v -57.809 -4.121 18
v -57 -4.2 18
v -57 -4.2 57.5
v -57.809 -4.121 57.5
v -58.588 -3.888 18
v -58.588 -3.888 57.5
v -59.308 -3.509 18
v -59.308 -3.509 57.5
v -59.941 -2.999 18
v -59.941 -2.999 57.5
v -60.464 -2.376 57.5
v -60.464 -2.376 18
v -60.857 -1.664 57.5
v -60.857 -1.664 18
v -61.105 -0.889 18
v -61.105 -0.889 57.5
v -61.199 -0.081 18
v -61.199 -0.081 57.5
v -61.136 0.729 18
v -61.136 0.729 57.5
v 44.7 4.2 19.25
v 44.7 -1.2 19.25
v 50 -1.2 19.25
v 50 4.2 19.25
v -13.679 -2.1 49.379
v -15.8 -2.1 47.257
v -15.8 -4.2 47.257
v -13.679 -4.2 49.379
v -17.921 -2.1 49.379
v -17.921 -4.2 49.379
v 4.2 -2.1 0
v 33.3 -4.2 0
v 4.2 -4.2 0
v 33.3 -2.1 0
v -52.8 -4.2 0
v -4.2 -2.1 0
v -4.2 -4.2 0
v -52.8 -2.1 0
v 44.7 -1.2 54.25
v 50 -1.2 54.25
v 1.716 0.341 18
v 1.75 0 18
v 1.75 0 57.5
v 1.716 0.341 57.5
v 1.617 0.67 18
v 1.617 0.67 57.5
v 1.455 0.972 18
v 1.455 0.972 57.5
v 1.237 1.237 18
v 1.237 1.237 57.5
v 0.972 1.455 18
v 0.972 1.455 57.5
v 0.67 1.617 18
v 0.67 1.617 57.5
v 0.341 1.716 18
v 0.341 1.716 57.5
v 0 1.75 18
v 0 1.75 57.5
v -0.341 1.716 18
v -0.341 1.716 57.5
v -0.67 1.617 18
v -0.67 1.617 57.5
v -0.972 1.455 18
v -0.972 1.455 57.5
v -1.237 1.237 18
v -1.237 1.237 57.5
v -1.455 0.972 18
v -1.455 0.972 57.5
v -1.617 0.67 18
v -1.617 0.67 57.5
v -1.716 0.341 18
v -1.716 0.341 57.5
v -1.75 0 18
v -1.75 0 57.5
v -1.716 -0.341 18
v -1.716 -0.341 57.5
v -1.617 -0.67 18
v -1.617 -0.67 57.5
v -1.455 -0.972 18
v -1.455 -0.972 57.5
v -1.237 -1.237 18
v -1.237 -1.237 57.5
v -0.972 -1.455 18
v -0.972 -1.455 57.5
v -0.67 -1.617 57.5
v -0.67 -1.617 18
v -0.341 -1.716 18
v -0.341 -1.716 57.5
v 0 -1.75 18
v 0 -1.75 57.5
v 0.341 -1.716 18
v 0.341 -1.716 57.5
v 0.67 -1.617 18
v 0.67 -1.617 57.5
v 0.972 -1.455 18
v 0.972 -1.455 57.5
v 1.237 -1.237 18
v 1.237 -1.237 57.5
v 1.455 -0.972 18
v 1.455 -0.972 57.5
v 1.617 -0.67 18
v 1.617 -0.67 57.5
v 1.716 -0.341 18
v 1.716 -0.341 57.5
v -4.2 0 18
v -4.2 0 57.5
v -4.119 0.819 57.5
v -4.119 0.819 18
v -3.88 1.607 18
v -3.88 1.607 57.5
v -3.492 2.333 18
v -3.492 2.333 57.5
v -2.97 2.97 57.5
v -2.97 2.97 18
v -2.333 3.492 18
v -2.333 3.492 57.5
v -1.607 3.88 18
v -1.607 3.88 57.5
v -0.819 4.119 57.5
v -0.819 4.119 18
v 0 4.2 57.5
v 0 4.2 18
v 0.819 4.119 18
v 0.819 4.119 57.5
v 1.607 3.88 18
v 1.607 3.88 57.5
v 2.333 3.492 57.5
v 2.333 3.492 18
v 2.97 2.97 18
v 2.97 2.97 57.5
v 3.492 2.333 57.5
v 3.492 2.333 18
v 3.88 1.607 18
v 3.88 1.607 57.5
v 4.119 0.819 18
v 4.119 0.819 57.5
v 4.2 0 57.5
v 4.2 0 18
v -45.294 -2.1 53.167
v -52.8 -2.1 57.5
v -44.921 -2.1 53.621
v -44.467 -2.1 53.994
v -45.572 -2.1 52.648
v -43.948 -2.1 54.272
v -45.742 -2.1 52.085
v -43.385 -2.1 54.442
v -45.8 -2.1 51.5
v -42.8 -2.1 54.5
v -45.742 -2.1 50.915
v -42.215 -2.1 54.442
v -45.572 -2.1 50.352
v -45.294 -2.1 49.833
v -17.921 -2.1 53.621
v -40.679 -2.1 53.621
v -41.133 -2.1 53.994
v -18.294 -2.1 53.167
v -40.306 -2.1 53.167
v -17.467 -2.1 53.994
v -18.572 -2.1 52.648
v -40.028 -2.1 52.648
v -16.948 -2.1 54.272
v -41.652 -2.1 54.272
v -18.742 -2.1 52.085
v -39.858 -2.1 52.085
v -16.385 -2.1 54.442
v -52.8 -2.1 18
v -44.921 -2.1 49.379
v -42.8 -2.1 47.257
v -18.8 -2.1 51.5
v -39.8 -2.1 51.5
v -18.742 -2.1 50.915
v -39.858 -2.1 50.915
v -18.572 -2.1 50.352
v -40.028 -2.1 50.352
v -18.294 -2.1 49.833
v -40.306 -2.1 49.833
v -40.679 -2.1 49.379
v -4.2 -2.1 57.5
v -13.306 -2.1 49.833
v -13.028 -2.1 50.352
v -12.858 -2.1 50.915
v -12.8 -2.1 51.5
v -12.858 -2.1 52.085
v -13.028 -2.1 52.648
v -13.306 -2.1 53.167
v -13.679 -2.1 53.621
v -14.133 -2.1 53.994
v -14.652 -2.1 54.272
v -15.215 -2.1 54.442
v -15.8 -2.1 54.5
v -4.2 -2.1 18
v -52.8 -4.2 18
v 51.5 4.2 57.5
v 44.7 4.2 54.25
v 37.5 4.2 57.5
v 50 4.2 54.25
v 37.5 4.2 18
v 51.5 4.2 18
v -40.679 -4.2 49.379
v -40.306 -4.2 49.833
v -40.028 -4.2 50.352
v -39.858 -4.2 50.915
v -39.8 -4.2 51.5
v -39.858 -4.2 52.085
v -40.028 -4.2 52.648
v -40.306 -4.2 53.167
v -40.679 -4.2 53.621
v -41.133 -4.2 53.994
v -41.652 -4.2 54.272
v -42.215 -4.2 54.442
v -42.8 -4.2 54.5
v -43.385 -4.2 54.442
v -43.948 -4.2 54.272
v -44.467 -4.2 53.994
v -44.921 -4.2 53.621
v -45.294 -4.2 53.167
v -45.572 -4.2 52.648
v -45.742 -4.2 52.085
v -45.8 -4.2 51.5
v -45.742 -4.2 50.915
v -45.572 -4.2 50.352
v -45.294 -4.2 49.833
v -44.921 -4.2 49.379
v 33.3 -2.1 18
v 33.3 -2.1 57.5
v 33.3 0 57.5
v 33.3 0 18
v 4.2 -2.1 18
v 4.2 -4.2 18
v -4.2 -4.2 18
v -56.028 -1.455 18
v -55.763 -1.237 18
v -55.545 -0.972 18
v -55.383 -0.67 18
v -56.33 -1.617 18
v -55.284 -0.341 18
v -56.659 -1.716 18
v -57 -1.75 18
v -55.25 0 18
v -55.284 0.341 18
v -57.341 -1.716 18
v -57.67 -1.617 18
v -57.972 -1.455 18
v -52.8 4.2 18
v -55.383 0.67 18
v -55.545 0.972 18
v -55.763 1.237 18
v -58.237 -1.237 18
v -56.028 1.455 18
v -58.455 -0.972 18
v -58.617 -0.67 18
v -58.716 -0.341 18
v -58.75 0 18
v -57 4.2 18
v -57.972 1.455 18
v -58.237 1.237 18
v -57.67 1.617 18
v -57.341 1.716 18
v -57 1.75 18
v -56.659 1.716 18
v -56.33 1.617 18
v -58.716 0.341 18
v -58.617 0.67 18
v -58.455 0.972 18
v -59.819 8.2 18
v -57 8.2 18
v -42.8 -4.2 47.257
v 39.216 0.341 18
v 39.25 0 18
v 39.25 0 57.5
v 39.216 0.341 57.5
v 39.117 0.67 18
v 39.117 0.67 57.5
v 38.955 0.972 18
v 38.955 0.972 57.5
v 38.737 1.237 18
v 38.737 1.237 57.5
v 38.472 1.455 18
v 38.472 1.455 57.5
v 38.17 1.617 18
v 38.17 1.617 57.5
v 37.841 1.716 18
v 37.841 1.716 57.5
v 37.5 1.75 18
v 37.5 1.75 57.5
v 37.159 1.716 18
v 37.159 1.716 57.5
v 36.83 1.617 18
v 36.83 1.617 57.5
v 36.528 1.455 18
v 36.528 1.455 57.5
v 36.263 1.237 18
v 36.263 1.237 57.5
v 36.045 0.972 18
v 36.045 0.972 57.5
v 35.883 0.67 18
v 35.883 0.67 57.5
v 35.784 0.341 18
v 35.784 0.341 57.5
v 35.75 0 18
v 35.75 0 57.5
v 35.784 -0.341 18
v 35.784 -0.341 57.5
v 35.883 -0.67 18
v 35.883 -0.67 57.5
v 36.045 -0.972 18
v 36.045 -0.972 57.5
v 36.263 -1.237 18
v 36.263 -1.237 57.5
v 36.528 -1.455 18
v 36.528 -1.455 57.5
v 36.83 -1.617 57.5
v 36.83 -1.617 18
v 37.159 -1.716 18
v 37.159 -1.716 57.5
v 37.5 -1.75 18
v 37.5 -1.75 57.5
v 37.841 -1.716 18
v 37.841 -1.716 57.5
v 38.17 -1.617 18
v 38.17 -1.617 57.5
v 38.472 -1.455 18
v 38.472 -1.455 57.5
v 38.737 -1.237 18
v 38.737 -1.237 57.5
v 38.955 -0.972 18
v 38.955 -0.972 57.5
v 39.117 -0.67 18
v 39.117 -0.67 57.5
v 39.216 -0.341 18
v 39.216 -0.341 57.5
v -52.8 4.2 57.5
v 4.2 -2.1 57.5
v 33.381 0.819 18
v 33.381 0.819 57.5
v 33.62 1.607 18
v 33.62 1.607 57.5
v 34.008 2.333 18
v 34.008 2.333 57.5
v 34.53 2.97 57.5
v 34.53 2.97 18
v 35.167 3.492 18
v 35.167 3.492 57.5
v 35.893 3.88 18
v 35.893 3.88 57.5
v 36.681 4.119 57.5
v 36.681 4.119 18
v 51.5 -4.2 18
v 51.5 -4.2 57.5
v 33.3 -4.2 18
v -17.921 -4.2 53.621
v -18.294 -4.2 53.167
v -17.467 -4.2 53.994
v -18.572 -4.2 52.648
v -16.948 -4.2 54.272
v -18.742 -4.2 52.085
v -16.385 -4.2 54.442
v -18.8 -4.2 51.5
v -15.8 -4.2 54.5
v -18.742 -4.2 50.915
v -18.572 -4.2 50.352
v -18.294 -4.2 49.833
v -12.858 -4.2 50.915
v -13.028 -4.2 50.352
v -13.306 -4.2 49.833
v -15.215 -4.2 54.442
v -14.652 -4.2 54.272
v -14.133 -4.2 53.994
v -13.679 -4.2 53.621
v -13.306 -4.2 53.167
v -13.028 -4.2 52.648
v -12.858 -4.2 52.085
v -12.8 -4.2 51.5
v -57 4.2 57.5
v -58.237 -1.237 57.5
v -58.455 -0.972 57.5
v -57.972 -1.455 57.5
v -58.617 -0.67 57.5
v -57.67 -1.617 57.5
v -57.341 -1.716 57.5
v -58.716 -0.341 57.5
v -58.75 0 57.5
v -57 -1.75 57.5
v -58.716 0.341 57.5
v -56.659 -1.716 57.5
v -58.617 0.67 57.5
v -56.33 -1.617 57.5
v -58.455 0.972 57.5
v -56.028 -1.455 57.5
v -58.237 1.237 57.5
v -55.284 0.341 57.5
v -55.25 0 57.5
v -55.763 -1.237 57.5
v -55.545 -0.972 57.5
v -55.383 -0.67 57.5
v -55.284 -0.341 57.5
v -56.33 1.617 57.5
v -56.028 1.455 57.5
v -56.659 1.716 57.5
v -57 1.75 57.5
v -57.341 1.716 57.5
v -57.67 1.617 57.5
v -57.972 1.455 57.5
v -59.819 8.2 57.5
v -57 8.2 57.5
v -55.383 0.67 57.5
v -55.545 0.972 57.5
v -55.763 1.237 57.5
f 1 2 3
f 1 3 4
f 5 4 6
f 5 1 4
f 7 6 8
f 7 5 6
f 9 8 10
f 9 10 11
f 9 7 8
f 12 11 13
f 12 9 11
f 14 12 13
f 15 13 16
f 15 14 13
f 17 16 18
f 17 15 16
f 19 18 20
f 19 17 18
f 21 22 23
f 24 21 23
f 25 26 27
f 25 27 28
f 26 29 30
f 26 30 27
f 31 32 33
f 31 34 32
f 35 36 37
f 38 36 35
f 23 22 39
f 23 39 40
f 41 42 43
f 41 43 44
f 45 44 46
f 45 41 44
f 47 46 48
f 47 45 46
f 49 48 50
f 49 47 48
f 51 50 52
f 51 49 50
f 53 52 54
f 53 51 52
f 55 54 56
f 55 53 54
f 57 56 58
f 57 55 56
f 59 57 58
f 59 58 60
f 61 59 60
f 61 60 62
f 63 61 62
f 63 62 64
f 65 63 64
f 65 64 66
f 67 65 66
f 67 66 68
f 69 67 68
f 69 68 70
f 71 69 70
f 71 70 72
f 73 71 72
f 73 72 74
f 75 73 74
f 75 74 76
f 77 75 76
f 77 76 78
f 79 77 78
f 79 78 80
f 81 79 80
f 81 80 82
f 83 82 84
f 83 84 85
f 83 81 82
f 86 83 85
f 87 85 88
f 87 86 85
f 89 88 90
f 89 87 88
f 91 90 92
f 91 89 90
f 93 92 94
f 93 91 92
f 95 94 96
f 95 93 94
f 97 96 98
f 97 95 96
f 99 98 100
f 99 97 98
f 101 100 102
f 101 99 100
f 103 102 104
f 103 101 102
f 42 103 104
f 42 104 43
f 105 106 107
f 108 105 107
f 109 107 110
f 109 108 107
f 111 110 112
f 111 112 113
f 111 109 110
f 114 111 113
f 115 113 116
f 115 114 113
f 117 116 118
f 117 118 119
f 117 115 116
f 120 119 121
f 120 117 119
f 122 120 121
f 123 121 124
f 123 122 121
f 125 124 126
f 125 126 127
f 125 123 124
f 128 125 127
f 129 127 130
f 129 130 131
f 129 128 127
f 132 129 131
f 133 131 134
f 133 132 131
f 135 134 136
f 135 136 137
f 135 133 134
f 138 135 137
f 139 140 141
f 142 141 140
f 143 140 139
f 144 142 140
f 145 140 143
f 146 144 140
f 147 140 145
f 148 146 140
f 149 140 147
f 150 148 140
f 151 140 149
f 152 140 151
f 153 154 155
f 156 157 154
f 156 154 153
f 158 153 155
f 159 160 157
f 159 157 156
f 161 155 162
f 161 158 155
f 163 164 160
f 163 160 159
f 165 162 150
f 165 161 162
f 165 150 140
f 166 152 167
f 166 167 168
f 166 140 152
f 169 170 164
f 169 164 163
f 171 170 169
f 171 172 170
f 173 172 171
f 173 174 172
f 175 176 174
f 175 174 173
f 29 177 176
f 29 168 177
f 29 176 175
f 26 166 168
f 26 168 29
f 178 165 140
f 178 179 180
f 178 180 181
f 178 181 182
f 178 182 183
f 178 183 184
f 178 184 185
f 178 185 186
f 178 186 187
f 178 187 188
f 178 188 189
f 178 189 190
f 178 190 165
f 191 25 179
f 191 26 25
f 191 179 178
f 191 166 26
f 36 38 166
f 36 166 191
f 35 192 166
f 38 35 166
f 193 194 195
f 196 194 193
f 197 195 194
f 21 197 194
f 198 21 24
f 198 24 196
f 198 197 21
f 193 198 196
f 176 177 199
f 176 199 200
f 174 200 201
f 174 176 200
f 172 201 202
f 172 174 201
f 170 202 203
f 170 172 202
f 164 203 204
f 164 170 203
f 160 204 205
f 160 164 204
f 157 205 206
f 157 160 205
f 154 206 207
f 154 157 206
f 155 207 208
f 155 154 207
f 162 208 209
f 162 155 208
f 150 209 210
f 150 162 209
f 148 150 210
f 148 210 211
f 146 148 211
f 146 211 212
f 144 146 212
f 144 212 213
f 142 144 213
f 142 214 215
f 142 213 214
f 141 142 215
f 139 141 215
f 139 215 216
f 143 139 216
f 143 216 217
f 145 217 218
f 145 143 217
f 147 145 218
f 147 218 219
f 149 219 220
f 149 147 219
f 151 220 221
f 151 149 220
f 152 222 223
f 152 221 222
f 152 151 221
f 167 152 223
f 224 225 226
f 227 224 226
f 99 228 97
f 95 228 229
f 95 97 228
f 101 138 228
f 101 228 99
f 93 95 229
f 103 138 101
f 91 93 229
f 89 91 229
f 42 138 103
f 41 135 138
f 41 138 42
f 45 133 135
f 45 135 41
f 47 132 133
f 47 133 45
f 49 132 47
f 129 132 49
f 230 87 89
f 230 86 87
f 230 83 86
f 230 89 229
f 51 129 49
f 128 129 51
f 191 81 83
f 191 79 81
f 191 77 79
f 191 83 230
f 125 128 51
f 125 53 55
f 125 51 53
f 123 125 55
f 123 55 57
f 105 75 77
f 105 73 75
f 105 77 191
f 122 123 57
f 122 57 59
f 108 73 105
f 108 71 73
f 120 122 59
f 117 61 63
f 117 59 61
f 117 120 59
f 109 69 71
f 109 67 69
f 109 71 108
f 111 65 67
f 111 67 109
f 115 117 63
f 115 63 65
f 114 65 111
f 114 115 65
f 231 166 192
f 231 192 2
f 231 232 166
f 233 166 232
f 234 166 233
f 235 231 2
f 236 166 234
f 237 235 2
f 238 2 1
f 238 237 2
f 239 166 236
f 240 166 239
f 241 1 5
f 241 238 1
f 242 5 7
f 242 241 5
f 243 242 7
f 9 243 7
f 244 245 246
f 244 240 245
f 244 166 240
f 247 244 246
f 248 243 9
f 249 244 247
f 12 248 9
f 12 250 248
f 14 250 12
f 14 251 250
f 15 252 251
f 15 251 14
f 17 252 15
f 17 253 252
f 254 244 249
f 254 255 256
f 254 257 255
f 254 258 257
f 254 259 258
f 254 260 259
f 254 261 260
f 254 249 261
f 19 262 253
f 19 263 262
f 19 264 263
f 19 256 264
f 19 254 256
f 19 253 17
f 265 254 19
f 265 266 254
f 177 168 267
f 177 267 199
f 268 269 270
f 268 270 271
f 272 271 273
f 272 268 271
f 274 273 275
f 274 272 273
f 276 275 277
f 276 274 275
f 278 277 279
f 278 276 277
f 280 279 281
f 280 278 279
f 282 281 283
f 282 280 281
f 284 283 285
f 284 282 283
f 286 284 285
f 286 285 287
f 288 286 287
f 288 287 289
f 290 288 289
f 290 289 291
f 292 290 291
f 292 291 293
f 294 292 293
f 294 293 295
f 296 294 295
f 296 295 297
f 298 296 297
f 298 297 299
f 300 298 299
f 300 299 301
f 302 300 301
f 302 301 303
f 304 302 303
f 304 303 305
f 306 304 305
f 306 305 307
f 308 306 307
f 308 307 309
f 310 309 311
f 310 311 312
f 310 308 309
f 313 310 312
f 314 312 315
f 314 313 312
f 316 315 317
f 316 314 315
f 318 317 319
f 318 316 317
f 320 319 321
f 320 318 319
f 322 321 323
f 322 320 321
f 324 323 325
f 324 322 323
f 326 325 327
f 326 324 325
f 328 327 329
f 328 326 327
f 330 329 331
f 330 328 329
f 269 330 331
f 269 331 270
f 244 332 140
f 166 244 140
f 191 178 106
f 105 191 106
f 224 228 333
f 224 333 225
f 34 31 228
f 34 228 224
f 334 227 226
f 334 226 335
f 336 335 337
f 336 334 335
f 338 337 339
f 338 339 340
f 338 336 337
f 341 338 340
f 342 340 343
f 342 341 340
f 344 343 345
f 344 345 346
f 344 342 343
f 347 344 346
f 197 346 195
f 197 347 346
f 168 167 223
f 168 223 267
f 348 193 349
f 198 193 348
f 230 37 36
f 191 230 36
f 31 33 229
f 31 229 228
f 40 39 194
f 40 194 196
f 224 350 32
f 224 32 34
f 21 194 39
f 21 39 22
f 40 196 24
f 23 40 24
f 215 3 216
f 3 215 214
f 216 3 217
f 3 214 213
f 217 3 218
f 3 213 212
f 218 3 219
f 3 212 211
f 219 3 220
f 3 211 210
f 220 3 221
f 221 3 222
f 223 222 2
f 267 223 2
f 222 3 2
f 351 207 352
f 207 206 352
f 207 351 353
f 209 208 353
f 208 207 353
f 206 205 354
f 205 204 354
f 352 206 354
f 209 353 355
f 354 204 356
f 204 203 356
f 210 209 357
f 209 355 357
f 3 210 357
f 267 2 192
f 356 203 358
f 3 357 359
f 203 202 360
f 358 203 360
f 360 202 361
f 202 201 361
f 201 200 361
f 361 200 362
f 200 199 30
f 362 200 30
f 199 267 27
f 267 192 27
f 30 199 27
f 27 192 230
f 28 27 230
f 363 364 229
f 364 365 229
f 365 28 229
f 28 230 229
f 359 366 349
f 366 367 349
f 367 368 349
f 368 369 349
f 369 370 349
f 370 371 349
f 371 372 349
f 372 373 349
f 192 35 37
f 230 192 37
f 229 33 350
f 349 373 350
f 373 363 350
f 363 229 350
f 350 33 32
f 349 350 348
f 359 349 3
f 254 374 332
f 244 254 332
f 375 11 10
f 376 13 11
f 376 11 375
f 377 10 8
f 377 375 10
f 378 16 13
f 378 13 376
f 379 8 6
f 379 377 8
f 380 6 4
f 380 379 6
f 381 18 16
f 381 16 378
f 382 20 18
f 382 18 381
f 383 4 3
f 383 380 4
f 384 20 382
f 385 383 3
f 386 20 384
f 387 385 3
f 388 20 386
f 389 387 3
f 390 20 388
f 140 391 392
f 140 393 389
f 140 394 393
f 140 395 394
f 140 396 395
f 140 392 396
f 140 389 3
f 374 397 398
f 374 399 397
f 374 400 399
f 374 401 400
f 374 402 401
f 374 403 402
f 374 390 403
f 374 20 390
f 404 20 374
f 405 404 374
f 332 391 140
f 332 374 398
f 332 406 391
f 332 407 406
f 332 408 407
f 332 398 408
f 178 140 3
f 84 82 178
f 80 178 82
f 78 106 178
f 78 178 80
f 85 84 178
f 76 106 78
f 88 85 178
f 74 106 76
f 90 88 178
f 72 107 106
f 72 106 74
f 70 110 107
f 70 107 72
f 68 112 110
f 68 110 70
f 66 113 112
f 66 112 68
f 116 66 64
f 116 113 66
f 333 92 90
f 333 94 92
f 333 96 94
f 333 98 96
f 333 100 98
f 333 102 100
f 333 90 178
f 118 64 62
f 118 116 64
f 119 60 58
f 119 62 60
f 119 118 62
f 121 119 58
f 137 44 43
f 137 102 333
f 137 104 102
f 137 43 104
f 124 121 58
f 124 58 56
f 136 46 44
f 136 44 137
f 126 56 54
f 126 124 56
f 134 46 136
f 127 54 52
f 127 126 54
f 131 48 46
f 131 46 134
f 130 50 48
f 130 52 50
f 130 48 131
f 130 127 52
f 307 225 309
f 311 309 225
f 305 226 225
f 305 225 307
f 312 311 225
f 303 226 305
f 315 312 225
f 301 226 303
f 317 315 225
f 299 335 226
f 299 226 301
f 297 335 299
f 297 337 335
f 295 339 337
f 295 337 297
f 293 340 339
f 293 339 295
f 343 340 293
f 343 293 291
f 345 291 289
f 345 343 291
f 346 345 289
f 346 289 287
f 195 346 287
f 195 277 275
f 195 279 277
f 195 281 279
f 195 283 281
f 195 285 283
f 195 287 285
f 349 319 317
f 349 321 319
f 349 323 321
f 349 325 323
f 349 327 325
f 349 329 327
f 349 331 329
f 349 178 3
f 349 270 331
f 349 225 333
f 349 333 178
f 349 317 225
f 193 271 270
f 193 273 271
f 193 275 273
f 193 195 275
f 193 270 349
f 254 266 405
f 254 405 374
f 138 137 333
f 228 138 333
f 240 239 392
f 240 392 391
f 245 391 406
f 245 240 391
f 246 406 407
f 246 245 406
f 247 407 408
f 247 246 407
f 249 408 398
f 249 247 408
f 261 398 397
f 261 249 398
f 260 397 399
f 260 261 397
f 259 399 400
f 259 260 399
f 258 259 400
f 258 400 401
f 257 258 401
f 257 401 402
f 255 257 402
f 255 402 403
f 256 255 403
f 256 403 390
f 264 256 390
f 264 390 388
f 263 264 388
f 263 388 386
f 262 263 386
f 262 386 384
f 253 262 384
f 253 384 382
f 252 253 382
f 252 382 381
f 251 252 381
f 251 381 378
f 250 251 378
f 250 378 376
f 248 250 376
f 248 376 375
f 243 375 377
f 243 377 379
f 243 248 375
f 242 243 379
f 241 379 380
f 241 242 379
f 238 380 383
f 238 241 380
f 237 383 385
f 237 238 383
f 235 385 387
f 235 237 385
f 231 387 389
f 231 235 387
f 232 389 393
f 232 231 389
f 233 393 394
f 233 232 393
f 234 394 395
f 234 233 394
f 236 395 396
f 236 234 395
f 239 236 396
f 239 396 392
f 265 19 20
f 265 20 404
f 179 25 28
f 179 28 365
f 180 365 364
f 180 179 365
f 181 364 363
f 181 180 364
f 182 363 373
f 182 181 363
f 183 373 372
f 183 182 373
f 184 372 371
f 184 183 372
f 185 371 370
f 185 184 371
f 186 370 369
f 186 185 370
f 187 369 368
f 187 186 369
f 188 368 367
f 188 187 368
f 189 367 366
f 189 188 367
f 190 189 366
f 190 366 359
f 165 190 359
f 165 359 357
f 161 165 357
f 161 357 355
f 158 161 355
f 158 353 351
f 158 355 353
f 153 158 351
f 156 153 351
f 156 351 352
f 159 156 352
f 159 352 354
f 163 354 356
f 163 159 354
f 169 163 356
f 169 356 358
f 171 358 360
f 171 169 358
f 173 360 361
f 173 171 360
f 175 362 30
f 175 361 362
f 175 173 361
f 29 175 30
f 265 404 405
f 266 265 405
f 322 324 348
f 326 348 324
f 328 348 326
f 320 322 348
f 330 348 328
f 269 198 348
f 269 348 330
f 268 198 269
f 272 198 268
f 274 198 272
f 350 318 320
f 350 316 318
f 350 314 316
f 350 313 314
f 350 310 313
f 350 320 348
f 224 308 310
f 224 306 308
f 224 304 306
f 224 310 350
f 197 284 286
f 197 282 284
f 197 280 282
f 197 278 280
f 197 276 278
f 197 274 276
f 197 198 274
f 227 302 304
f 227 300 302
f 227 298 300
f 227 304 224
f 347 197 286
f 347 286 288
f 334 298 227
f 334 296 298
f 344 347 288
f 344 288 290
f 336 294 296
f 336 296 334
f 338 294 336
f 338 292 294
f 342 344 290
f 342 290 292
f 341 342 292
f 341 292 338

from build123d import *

# Parameters (mm, degrees)
SKETCH1_R           = 1.75
BOSS_EXTRUDE1_DEPTH = 57.5
BOSS_EXTRUDE2_DEPTH = 8.4
SKETCH3_W           = 5.3
SKETCH3_H           = 35
CUT_EXTRUDE1_DEPTH  = 5.4
CUT_EXTRUDE2_DEPTH  = 3.1
SKETCH5_W           = 18.2
SKETCH5_H           = 8.4
SKETCH5_W_2         = 8.4
SKETCH5_H_2         = 8.937392322
SKETCH5_W_3         = 9.875614017
SKETCH5_H_3         = 12.4
CUT_EXTRUDE3_DEPTH  = 18
LPATTERN1_COUNT     = 2
LPATTERN1_PITCH     = 27


with BuildPart() as part:
    # Sketch1 → Boss-Extrude1 (new body)
    with BuildSketch(Plane.XY):
        with BuildLine():
            Line((-52.8, -2.1), (-4.2, -2.1))
            Line((-4.2, -2.1), (-4.2, 0))
            ThreePointArc((-4.2, 0), (0, 4.2), (4.2, 0))
            Line((4.2, 0), (4.2, -2.1))
            Line((4.2, -2.1), (33.3, -2.1))
            Line((33.3, -2.1), (33.3, 0))
            ThreePointArc((33.3, 0), (34.530151519, 2.969848481), (37.5, 4.2))
            Line((37.5, 4.2), (41.5, 4.2))
            Line((41.5, 4.2), (41.5, -4.2))
            Line((41.5, -4.2), (-57, -4.2))
            ThreePointArc((-57, -4.2), (-60.217386661, -2.699707961), (-61.136192563, 0.729322346))
            Line((-61.136192563, 0.729322346), (-59.818910528, 8.2))
            Line((-59.818910528, 8.2), (-57, 8.2))
            Line((-57, 8.2), (-57, 4.2))
            Line((-57, 4.2), (-52.8, 4.2))
            Line((-52.8, 4.2), (-52.8, -2.1))
        make_face()
        Circle(SKETCH1_R, mode=Mode.SUBTRACT)
        with Locations((-57, 0)):
            Circle(SKETCH1_R, mode=Mode.SUBTRACT)
        with Locations((37.5, 0)):
            Circle(SKETCH1_R, mode=Mode.SUBTRACT)
    extrude(amount=BOSS_EXTRUDE1_DEPTH)

    # Sketch2 → Boss-Extrude2 (add)
    with BuildSketch(Plane(origin=(0, 4.2, 0), x_dir=(1, 0, 0), z_dir=(0, 1, 0))):
        Polygon((41.5, -57.5), (51.5, -57.5), (51.5, -17.5), (41.5, 0), align=None)
    extrude(amount=-BOSS_EXTRUDE2_DEPTH)

    # Sketch3 → Cut-Extrude1 (cut)
    with BuildSketch(Plane(origin=(0, 4.2, 0), x_dir=(1, 0, 0), z_dir=(0, 1, 0))):
        with Locations((47.35, -36.75)):
            Rectangle(SKETCH3_W, SKETCH3_H)
    extrude(amount=-CUT_EXTRUDE1_DEPTH, mode=Mode.SUBTRACT)

    # Sketch4 → Cut-Extrude2 (cut, through all)
    with BuildSketch(Plane(origin=(0, -2.1, 0), x_dir=(1, 0, 0), z_dir=(0, 1, 0))):
        with BuildLine():
            Line((-44.921320344, -49.378679656), (-42.8, -47.257359313))
            Line((-42.8, -47.257359313), (-40.678679656, -49.378679656))
            ThreePointArc((-40.678679656, -49.378679656), (-42.8, -54.5), (-44.921320344, -49.378679656))
        make_face()
    cut_extrude2 = extrude(amount=-CUT_EXTRUDE2_DEPTH, mode=Mode.SUBTRACT)

    # Sketch5 → Cut-Extrude3 (cut)
    with BuildSketch(Plane(origin=(0, 0, 0), x_dir=(-1, 0, 0), z_dir=(0, 0, -1))):
        with Locations((-42.4, 0)):
            Rectangle(SKETCH5_W, SKETCH5_H)
        with Locations((0, 0.268696161)):
            Rectangle(SKETCH5_W_2, SKETCH5_H_2)
        with Locations((57.737807008, 2)):
            Rectangle(SKETCH5_W_3, SKETCH5_H_3)
    extrude(amount=-CUT_EXTRUDE3_DEPTH, mode=Mode.SUBTRACT)

    # LPattern1: Cut-Extrude2 ×2
    with Locations(*[(i * LPATTERN1_PITCH, 0, 0) for i in range(1, LPATTERN1_COUNT)]):
        add(cut_extrude2, mode=Mode.SUBTRACT)


solid = part.part
